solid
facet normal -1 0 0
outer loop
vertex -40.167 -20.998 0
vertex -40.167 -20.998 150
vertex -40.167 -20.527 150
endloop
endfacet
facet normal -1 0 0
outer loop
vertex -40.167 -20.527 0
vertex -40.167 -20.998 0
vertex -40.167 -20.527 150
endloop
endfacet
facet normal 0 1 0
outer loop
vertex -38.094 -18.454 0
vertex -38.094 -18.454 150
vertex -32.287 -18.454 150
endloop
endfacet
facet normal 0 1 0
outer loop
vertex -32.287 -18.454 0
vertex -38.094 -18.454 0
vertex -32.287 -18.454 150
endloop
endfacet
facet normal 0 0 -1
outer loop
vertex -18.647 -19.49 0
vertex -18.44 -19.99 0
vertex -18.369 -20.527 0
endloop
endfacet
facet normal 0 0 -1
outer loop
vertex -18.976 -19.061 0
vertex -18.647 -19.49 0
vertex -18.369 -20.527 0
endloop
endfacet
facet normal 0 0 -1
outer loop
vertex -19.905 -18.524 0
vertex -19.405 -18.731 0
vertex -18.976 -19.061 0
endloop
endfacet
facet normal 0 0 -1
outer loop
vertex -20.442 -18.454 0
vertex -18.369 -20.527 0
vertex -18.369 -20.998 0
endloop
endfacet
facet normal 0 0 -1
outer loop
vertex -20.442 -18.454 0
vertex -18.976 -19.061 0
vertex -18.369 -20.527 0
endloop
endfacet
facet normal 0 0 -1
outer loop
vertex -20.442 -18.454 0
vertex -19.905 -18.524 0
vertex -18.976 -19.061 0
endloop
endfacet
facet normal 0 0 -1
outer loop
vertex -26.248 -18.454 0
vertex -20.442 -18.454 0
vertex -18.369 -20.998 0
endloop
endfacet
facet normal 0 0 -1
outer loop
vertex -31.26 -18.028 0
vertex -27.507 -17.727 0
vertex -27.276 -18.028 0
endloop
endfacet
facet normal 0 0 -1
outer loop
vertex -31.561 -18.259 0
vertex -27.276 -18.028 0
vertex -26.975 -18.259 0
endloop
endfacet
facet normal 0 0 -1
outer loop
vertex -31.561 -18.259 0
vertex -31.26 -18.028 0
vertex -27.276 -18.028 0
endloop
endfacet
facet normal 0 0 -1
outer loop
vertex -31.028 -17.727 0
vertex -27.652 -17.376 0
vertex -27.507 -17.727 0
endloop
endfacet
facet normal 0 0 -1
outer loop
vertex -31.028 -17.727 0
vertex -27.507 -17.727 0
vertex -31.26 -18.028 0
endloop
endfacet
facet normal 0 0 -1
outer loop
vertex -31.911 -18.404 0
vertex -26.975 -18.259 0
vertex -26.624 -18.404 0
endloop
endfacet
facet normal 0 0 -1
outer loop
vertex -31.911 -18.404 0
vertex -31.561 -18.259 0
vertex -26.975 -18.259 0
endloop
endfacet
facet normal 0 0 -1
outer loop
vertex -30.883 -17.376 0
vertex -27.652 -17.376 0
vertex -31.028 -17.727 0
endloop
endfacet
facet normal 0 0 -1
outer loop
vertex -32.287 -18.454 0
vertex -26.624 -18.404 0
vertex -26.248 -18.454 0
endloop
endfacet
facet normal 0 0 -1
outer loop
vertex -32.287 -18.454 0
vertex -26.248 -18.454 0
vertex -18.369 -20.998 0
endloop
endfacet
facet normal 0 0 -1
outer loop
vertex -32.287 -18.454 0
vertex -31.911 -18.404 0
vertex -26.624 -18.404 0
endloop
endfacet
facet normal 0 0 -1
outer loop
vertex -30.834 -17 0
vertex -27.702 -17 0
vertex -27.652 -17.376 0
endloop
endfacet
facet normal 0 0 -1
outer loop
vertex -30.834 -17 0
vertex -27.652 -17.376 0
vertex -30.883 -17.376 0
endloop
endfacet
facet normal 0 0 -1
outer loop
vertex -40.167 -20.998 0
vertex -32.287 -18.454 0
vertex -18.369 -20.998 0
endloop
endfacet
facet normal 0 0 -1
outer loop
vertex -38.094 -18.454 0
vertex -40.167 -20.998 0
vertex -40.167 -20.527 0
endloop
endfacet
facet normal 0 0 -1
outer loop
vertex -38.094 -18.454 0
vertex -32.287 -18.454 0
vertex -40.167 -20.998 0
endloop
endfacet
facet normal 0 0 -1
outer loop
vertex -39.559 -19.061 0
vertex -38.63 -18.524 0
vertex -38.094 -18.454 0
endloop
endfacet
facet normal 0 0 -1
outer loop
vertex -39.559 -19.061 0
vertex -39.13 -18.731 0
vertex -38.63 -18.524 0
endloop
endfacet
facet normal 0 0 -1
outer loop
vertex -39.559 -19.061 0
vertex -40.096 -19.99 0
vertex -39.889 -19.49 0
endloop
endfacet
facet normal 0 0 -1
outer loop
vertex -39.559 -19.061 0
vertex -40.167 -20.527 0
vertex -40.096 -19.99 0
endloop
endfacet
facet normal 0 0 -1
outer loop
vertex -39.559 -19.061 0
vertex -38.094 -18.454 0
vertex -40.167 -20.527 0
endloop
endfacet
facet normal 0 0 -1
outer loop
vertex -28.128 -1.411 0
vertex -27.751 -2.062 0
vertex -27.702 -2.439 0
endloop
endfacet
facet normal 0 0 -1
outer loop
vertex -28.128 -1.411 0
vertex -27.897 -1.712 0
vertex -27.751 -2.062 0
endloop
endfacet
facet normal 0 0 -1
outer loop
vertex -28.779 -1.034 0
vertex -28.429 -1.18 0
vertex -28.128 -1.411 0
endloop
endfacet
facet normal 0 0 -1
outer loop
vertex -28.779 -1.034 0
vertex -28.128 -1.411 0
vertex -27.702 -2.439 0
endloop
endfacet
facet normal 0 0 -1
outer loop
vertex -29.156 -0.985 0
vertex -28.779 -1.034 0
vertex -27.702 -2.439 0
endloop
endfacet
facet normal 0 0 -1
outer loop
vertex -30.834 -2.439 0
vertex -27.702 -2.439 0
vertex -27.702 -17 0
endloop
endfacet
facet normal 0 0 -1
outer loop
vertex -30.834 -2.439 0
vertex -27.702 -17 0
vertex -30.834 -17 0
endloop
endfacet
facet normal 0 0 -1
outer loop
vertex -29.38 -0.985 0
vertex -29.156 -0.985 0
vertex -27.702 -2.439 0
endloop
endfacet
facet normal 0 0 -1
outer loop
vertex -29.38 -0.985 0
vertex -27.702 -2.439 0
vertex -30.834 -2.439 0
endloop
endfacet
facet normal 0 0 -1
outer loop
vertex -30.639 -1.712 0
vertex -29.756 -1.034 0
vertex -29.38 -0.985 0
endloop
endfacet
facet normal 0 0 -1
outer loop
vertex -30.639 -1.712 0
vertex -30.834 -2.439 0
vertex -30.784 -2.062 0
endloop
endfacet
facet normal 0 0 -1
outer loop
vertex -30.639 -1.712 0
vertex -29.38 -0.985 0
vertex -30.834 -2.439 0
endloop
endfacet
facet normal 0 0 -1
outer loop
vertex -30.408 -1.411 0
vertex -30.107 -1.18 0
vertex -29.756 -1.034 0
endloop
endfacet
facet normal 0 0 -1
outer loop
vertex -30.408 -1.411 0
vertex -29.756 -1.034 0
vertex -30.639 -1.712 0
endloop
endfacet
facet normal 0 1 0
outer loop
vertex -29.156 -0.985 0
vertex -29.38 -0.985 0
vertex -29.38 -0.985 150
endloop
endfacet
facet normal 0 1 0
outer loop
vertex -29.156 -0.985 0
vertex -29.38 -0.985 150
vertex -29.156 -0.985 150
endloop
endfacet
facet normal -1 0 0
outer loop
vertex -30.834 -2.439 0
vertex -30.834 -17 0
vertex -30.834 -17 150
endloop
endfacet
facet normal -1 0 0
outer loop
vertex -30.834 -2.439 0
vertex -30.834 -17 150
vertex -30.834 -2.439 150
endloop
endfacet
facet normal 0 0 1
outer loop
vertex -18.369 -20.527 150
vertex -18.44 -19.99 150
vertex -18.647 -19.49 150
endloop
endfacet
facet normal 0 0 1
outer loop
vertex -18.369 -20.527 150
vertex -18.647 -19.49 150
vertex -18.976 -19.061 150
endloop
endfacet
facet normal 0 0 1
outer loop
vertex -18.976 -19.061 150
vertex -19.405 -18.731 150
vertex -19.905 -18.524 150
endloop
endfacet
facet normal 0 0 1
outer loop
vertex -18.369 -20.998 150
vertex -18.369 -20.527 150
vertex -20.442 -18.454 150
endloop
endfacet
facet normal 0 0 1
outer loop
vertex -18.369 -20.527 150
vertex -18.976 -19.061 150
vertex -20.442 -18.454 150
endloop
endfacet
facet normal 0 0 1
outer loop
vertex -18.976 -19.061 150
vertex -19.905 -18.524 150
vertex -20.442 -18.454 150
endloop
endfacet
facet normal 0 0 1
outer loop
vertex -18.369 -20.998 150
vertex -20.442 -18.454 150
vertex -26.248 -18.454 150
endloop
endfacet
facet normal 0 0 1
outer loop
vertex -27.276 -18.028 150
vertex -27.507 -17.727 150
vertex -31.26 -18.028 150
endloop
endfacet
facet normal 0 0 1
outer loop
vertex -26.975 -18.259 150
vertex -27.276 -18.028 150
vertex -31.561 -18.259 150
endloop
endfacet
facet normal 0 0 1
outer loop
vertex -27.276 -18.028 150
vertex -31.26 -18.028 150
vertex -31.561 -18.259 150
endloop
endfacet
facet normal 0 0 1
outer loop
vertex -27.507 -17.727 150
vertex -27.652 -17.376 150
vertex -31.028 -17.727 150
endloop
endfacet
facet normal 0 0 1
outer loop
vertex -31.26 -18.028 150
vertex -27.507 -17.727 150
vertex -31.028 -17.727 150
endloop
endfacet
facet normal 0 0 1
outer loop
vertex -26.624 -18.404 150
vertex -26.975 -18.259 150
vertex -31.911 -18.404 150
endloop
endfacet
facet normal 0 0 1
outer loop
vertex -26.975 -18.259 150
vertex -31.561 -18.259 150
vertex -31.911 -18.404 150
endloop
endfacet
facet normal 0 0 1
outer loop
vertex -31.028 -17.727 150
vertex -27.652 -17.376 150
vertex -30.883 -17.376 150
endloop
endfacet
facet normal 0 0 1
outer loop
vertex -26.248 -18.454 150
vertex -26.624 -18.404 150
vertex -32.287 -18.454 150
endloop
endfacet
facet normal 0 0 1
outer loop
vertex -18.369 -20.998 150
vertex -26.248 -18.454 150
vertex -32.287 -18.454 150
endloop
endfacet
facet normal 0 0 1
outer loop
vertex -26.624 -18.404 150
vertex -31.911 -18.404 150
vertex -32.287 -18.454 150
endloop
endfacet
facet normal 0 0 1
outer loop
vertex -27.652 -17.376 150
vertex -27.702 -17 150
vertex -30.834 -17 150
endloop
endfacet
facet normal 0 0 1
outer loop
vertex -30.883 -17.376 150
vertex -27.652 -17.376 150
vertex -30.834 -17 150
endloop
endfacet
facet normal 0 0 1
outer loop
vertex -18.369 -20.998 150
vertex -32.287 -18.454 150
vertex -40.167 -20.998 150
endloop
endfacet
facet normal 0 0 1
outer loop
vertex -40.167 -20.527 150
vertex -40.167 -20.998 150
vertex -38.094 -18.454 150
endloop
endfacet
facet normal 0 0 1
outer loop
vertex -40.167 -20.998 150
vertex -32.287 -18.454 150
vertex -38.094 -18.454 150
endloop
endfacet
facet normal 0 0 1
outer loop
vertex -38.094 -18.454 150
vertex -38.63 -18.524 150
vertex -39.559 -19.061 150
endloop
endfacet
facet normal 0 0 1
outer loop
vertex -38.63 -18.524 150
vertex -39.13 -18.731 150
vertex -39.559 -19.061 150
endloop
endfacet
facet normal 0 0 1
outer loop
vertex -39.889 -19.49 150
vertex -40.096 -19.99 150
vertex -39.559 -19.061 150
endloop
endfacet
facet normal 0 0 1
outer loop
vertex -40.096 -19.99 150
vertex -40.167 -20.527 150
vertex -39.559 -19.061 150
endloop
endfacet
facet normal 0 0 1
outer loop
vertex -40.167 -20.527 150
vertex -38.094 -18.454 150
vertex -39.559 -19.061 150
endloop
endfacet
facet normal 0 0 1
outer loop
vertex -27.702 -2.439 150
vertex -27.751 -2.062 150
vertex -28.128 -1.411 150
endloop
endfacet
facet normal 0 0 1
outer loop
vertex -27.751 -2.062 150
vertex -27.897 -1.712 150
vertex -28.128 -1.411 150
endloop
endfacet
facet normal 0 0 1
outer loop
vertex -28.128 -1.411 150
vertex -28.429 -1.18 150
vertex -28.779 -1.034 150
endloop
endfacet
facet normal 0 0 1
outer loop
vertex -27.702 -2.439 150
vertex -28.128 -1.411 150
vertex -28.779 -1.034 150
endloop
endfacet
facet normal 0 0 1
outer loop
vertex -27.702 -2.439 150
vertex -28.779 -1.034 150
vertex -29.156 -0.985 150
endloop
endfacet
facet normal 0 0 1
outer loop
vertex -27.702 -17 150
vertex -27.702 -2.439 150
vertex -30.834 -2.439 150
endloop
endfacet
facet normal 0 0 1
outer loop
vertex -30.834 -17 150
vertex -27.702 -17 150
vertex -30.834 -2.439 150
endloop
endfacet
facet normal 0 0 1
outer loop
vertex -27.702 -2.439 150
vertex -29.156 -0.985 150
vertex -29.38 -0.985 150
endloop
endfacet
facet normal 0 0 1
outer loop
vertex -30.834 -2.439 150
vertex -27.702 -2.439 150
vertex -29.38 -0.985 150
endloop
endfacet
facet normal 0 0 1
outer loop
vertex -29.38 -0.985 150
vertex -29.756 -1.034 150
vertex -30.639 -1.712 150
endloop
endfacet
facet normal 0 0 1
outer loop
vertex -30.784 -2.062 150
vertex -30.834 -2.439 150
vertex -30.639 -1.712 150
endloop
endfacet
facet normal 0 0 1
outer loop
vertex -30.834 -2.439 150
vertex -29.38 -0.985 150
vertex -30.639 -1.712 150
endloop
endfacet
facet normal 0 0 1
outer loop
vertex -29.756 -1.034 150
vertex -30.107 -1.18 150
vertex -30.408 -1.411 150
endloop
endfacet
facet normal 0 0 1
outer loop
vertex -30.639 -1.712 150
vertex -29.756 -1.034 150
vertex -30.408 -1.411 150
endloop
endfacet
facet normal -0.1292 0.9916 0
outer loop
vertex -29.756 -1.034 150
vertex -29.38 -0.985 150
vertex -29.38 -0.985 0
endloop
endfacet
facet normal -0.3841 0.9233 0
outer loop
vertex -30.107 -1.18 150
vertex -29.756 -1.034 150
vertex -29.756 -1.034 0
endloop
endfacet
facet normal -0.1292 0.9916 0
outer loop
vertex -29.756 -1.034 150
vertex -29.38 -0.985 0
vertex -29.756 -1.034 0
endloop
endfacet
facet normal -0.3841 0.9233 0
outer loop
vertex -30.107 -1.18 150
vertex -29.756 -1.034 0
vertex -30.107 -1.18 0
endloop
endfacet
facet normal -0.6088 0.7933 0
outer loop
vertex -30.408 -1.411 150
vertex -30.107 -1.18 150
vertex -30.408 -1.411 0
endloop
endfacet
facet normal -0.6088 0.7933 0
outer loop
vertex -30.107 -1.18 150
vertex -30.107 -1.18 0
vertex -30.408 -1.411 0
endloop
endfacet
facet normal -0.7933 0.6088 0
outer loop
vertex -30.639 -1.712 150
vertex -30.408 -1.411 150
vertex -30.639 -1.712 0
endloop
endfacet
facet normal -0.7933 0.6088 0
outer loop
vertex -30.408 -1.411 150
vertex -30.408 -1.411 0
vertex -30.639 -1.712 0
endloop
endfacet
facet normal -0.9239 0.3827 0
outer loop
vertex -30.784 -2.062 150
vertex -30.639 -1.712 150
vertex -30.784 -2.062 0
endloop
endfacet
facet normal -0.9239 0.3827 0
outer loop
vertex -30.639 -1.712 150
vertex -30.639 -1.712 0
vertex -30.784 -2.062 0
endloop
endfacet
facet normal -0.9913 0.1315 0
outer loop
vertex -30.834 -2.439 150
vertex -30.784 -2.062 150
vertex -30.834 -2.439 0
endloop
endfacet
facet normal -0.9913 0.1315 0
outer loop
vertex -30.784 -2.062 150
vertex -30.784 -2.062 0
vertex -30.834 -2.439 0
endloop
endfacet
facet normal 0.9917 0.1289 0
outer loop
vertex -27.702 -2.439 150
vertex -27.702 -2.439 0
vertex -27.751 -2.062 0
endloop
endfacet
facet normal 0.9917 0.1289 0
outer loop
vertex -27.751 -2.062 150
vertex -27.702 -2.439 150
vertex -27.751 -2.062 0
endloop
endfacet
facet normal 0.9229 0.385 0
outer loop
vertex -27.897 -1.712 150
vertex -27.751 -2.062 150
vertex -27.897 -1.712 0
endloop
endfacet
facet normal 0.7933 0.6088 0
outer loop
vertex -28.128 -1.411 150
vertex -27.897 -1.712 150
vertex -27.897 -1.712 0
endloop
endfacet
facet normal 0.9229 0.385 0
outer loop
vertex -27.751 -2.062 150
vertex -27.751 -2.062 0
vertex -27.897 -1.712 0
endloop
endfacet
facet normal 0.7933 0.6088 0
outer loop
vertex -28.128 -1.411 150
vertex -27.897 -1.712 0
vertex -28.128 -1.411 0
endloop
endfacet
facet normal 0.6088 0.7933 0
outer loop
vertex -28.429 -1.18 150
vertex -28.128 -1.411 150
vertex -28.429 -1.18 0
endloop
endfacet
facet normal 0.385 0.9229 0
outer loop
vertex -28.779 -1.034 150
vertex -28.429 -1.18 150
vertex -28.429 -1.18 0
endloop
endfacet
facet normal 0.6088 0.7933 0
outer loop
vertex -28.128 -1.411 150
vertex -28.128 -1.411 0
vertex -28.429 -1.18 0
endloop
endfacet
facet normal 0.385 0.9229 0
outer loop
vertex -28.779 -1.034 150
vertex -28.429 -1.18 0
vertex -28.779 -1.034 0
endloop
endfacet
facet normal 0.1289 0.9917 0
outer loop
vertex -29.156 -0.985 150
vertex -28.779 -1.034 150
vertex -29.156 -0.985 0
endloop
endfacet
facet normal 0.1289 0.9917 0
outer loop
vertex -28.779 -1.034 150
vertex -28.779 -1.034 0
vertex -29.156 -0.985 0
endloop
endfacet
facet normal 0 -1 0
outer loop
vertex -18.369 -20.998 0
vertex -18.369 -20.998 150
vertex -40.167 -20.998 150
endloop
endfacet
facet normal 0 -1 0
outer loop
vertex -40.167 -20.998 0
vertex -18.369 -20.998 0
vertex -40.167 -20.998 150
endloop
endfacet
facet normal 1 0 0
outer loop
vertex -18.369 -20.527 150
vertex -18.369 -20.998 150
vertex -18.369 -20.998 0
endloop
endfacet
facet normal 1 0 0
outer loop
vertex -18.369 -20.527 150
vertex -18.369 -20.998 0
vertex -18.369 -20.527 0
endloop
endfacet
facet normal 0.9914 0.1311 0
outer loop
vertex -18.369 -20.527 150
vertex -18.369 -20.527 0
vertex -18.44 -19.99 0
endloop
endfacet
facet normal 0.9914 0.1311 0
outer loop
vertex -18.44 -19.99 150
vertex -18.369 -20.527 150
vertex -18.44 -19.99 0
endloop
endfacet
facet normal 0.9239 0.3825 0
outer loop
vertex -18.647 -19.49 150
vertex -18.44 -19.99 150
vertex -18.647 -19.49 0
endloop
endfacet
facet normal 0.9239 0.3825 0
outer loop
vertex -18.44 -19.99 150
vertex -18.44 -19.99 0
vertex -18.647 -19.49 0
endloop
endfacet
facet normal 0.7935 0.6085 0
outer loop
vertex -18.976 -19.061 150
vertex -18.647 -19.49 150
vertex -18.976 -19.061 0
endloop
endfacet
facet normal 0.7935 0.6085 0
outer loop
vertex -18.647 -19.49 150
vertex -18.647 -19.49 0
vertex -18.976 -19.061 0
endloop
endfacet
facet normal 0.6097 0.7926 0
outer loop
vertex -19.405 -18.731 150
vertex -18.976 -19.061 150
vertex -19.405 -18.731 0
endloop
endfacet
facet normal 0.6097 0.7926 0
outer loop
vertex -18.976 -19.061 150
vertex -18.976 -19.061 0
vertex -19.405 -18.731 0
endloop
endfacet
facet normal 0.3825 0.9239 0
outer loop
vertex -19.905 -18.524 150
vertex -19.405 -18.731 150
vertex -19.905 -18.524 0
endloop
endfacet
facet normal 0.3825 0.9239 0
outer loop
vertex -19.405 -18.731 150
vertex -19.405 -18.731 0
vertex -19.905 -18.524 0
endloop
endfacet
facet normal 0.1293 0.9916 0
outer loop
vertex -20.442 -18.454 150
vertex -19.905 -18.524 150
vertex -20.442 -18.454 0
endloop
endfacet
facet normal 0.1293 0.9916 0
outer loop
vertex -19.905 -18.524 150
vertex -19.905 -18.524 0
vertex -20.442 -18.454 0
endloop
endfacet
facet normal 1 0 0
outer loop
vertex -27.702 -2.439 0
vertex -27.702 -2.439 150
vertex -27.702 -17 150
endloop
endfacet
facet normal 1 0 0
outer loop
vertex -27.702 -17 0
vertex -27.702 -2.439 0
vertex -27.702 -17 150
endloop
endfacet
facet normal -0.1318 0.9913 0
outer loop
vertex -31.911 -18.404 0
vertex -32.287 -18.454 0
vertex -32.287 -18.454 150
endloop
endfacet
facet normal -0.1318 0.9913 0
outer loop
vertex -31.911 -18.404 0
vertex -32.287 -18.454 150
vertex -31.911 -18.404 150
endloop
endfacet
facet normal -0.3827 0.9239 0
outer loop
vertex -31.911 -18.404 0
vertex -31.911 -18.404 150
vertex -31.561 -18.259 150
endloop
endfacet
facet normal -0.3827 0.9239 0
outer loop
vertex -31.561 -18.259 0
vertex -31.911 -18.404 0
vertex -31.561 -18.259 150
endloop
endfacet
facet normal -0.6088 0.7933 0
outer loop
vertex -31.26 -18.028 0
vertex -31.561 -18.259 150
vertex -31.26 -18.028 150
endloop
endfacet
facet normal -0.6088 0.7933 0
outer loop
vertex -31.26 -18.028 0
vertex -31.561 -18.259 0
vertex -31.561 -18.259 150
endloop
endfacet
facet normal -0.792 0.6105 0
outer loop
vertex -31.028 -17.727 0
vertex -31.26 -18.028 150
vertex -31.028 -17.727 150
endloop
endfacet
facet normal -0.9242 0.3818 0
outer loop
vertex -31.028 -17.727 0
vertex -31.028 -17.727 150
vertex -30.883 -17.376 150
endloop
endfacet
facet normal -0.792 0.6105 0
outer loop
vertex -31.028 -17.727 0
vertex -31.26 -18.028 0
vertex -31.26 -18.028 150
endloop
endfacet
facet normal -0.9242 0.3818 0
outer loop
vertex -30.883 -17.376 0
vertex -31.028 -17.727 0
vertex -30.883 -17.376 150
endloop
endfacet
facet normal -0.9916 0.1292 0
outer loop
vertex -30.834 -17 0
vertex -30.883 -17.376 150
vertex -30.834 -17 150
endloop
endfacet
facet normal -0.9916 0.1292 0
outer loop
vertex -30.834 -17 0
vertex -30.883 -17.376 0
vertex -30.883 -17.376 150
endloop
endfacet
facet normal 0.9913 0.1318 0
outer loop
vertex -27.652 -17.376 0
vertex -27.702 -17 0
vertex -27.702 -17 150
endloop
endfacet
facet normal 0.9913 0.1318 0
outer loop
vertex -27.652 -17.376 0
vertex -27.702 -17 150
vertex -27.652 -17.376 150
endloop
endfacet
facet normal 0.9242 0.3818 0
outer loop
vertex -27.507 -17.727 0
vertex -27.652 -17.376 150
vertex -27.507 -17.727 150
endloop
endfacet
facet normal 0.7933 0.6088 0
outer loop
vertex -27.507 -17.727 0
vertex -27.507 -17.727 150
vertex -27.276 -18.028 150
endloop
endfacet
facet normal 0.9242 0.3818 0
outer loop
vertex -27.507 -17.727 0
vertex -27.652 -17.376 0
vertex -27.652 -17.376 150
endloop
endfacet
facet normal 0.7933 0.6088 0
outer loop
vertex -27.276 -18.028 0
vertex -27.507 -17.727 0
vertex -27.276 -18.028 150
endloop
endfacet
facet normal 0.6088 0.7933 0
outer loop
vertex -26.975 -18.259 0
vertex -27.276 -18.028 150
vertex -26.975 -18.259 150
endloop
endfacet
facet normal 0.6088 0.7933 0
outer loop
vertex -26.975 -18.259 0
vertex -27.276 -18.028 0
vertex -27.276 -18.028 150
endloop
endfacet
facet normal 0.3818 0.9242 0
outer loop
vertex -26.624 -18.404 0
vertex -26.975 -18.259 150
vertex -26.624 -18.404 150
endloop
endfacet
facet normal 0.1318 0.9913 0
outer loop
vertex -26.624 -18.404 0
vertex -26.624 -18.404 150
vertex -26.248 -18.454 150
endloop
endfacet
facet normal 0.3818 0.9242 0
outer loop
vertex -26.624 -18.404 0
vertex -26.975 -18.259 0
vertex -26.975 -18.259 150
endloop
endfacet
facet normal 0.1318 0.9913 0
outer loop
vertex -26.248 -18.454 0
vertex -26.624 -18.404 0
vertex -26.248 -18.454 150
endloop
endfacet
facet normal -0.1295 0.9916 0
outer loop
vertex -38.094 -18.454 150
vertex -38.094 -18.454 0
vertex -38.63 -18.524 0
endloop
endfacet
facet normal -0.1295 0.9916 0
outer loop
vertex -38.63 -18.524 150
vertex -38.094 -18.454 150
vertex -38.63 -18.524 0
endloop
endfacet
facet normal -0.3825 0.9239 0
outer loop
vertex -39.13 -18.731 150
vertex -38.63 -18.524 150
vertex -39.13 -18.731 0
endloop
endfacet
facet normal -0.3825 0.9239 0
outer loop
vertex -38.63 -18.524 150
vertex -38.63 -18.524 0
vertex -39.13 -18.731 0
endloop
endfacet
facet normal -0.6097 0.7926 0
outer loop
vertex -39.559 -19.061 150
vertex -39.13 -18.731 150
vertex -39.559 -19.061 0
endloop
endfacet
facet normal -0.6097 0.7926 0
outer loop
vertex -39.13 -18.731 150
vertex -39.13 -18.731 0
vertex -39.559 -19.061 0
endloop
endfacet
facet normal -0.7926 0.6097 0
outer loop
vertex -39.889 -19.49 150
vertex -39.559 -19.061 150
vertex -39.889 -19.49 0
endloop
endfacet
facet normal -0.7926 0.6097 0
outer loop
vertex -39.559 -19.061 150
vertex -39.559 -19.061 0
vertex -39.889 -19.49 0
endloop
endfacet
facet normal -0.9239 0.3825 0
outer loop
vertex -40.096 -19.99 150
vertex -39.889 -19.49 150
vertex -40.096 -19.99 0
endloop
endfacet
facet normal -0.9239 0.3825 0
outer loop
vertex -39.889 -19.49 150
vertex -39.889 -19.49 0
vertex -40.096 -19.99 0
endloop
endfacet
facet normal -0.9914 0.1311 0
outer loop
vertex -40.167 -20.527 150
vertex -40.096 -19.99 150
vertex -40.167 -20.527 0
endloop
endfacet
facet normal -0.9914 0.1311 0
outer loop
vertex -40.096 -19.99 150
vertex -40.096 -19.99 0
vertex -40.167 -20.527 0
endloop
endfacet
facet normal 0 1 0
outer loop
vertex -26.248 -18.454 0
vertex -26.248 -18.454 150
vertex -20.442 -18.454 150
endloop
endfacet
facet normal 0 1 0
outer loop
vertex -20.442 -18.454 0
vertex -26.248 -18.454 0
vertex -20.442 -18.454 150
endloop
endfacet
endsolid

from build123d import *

# Parameters (mm, degrees)
PAD_DEPTH = 150


with BuildPart() as part:
    # Sketch001 → Pad (new body)
    with BuildSketch(Plane.XY):
        with BuildLine():
            Line((-38.093584, -18.453745), (-32.287479, -18.453745))
            ThreePointArc((-32.287479, -18.453745), (-31.259526, -18.027953), (-30.833734, -17))
            Line((-30.833734, -17), (-30.833734, -2.438641))
            ThreePointArc((-29.37999, -0.984896), (-30.407943, -1.410688), (-30.833734, -2.438641))
            Line((-29.37999, -0.984896), (-29.155547, -0.984896))
            ThreePointArc((-27.701803, -2.438641), (-28.127595, -1.410688), (-29.155547, -0.984896))
            Line((-27.701803, -2.438641), (-27.701803, -17))
            ThreePointArc((-27.701803, -17), (-27.276011, -18.027953), (-26.248058, -18.453745))
            Line((-26.248058, -18.453745), (-20.441954, -18.453745))
            ThreePointArc((-18.368877, -20.526822), (-18.976067, -19.060935), (-20.441954, -18.453745))
            Line((-18.368877, -20.998255), (-18.368877, -20.526822))
            Line((-18.368877, -20.998255), (-40.16666, -20.998255))
            Line((-40.16666, -20.998255), (-40.16666, -20.526822))
            ThreePointArc((-38.093584, -18.453745), (-39.55947, -19.060935), (-40.16666, -20.526822))
        make_face()
    extrude(amount=PAD_DEPTH)


solid = part.part
